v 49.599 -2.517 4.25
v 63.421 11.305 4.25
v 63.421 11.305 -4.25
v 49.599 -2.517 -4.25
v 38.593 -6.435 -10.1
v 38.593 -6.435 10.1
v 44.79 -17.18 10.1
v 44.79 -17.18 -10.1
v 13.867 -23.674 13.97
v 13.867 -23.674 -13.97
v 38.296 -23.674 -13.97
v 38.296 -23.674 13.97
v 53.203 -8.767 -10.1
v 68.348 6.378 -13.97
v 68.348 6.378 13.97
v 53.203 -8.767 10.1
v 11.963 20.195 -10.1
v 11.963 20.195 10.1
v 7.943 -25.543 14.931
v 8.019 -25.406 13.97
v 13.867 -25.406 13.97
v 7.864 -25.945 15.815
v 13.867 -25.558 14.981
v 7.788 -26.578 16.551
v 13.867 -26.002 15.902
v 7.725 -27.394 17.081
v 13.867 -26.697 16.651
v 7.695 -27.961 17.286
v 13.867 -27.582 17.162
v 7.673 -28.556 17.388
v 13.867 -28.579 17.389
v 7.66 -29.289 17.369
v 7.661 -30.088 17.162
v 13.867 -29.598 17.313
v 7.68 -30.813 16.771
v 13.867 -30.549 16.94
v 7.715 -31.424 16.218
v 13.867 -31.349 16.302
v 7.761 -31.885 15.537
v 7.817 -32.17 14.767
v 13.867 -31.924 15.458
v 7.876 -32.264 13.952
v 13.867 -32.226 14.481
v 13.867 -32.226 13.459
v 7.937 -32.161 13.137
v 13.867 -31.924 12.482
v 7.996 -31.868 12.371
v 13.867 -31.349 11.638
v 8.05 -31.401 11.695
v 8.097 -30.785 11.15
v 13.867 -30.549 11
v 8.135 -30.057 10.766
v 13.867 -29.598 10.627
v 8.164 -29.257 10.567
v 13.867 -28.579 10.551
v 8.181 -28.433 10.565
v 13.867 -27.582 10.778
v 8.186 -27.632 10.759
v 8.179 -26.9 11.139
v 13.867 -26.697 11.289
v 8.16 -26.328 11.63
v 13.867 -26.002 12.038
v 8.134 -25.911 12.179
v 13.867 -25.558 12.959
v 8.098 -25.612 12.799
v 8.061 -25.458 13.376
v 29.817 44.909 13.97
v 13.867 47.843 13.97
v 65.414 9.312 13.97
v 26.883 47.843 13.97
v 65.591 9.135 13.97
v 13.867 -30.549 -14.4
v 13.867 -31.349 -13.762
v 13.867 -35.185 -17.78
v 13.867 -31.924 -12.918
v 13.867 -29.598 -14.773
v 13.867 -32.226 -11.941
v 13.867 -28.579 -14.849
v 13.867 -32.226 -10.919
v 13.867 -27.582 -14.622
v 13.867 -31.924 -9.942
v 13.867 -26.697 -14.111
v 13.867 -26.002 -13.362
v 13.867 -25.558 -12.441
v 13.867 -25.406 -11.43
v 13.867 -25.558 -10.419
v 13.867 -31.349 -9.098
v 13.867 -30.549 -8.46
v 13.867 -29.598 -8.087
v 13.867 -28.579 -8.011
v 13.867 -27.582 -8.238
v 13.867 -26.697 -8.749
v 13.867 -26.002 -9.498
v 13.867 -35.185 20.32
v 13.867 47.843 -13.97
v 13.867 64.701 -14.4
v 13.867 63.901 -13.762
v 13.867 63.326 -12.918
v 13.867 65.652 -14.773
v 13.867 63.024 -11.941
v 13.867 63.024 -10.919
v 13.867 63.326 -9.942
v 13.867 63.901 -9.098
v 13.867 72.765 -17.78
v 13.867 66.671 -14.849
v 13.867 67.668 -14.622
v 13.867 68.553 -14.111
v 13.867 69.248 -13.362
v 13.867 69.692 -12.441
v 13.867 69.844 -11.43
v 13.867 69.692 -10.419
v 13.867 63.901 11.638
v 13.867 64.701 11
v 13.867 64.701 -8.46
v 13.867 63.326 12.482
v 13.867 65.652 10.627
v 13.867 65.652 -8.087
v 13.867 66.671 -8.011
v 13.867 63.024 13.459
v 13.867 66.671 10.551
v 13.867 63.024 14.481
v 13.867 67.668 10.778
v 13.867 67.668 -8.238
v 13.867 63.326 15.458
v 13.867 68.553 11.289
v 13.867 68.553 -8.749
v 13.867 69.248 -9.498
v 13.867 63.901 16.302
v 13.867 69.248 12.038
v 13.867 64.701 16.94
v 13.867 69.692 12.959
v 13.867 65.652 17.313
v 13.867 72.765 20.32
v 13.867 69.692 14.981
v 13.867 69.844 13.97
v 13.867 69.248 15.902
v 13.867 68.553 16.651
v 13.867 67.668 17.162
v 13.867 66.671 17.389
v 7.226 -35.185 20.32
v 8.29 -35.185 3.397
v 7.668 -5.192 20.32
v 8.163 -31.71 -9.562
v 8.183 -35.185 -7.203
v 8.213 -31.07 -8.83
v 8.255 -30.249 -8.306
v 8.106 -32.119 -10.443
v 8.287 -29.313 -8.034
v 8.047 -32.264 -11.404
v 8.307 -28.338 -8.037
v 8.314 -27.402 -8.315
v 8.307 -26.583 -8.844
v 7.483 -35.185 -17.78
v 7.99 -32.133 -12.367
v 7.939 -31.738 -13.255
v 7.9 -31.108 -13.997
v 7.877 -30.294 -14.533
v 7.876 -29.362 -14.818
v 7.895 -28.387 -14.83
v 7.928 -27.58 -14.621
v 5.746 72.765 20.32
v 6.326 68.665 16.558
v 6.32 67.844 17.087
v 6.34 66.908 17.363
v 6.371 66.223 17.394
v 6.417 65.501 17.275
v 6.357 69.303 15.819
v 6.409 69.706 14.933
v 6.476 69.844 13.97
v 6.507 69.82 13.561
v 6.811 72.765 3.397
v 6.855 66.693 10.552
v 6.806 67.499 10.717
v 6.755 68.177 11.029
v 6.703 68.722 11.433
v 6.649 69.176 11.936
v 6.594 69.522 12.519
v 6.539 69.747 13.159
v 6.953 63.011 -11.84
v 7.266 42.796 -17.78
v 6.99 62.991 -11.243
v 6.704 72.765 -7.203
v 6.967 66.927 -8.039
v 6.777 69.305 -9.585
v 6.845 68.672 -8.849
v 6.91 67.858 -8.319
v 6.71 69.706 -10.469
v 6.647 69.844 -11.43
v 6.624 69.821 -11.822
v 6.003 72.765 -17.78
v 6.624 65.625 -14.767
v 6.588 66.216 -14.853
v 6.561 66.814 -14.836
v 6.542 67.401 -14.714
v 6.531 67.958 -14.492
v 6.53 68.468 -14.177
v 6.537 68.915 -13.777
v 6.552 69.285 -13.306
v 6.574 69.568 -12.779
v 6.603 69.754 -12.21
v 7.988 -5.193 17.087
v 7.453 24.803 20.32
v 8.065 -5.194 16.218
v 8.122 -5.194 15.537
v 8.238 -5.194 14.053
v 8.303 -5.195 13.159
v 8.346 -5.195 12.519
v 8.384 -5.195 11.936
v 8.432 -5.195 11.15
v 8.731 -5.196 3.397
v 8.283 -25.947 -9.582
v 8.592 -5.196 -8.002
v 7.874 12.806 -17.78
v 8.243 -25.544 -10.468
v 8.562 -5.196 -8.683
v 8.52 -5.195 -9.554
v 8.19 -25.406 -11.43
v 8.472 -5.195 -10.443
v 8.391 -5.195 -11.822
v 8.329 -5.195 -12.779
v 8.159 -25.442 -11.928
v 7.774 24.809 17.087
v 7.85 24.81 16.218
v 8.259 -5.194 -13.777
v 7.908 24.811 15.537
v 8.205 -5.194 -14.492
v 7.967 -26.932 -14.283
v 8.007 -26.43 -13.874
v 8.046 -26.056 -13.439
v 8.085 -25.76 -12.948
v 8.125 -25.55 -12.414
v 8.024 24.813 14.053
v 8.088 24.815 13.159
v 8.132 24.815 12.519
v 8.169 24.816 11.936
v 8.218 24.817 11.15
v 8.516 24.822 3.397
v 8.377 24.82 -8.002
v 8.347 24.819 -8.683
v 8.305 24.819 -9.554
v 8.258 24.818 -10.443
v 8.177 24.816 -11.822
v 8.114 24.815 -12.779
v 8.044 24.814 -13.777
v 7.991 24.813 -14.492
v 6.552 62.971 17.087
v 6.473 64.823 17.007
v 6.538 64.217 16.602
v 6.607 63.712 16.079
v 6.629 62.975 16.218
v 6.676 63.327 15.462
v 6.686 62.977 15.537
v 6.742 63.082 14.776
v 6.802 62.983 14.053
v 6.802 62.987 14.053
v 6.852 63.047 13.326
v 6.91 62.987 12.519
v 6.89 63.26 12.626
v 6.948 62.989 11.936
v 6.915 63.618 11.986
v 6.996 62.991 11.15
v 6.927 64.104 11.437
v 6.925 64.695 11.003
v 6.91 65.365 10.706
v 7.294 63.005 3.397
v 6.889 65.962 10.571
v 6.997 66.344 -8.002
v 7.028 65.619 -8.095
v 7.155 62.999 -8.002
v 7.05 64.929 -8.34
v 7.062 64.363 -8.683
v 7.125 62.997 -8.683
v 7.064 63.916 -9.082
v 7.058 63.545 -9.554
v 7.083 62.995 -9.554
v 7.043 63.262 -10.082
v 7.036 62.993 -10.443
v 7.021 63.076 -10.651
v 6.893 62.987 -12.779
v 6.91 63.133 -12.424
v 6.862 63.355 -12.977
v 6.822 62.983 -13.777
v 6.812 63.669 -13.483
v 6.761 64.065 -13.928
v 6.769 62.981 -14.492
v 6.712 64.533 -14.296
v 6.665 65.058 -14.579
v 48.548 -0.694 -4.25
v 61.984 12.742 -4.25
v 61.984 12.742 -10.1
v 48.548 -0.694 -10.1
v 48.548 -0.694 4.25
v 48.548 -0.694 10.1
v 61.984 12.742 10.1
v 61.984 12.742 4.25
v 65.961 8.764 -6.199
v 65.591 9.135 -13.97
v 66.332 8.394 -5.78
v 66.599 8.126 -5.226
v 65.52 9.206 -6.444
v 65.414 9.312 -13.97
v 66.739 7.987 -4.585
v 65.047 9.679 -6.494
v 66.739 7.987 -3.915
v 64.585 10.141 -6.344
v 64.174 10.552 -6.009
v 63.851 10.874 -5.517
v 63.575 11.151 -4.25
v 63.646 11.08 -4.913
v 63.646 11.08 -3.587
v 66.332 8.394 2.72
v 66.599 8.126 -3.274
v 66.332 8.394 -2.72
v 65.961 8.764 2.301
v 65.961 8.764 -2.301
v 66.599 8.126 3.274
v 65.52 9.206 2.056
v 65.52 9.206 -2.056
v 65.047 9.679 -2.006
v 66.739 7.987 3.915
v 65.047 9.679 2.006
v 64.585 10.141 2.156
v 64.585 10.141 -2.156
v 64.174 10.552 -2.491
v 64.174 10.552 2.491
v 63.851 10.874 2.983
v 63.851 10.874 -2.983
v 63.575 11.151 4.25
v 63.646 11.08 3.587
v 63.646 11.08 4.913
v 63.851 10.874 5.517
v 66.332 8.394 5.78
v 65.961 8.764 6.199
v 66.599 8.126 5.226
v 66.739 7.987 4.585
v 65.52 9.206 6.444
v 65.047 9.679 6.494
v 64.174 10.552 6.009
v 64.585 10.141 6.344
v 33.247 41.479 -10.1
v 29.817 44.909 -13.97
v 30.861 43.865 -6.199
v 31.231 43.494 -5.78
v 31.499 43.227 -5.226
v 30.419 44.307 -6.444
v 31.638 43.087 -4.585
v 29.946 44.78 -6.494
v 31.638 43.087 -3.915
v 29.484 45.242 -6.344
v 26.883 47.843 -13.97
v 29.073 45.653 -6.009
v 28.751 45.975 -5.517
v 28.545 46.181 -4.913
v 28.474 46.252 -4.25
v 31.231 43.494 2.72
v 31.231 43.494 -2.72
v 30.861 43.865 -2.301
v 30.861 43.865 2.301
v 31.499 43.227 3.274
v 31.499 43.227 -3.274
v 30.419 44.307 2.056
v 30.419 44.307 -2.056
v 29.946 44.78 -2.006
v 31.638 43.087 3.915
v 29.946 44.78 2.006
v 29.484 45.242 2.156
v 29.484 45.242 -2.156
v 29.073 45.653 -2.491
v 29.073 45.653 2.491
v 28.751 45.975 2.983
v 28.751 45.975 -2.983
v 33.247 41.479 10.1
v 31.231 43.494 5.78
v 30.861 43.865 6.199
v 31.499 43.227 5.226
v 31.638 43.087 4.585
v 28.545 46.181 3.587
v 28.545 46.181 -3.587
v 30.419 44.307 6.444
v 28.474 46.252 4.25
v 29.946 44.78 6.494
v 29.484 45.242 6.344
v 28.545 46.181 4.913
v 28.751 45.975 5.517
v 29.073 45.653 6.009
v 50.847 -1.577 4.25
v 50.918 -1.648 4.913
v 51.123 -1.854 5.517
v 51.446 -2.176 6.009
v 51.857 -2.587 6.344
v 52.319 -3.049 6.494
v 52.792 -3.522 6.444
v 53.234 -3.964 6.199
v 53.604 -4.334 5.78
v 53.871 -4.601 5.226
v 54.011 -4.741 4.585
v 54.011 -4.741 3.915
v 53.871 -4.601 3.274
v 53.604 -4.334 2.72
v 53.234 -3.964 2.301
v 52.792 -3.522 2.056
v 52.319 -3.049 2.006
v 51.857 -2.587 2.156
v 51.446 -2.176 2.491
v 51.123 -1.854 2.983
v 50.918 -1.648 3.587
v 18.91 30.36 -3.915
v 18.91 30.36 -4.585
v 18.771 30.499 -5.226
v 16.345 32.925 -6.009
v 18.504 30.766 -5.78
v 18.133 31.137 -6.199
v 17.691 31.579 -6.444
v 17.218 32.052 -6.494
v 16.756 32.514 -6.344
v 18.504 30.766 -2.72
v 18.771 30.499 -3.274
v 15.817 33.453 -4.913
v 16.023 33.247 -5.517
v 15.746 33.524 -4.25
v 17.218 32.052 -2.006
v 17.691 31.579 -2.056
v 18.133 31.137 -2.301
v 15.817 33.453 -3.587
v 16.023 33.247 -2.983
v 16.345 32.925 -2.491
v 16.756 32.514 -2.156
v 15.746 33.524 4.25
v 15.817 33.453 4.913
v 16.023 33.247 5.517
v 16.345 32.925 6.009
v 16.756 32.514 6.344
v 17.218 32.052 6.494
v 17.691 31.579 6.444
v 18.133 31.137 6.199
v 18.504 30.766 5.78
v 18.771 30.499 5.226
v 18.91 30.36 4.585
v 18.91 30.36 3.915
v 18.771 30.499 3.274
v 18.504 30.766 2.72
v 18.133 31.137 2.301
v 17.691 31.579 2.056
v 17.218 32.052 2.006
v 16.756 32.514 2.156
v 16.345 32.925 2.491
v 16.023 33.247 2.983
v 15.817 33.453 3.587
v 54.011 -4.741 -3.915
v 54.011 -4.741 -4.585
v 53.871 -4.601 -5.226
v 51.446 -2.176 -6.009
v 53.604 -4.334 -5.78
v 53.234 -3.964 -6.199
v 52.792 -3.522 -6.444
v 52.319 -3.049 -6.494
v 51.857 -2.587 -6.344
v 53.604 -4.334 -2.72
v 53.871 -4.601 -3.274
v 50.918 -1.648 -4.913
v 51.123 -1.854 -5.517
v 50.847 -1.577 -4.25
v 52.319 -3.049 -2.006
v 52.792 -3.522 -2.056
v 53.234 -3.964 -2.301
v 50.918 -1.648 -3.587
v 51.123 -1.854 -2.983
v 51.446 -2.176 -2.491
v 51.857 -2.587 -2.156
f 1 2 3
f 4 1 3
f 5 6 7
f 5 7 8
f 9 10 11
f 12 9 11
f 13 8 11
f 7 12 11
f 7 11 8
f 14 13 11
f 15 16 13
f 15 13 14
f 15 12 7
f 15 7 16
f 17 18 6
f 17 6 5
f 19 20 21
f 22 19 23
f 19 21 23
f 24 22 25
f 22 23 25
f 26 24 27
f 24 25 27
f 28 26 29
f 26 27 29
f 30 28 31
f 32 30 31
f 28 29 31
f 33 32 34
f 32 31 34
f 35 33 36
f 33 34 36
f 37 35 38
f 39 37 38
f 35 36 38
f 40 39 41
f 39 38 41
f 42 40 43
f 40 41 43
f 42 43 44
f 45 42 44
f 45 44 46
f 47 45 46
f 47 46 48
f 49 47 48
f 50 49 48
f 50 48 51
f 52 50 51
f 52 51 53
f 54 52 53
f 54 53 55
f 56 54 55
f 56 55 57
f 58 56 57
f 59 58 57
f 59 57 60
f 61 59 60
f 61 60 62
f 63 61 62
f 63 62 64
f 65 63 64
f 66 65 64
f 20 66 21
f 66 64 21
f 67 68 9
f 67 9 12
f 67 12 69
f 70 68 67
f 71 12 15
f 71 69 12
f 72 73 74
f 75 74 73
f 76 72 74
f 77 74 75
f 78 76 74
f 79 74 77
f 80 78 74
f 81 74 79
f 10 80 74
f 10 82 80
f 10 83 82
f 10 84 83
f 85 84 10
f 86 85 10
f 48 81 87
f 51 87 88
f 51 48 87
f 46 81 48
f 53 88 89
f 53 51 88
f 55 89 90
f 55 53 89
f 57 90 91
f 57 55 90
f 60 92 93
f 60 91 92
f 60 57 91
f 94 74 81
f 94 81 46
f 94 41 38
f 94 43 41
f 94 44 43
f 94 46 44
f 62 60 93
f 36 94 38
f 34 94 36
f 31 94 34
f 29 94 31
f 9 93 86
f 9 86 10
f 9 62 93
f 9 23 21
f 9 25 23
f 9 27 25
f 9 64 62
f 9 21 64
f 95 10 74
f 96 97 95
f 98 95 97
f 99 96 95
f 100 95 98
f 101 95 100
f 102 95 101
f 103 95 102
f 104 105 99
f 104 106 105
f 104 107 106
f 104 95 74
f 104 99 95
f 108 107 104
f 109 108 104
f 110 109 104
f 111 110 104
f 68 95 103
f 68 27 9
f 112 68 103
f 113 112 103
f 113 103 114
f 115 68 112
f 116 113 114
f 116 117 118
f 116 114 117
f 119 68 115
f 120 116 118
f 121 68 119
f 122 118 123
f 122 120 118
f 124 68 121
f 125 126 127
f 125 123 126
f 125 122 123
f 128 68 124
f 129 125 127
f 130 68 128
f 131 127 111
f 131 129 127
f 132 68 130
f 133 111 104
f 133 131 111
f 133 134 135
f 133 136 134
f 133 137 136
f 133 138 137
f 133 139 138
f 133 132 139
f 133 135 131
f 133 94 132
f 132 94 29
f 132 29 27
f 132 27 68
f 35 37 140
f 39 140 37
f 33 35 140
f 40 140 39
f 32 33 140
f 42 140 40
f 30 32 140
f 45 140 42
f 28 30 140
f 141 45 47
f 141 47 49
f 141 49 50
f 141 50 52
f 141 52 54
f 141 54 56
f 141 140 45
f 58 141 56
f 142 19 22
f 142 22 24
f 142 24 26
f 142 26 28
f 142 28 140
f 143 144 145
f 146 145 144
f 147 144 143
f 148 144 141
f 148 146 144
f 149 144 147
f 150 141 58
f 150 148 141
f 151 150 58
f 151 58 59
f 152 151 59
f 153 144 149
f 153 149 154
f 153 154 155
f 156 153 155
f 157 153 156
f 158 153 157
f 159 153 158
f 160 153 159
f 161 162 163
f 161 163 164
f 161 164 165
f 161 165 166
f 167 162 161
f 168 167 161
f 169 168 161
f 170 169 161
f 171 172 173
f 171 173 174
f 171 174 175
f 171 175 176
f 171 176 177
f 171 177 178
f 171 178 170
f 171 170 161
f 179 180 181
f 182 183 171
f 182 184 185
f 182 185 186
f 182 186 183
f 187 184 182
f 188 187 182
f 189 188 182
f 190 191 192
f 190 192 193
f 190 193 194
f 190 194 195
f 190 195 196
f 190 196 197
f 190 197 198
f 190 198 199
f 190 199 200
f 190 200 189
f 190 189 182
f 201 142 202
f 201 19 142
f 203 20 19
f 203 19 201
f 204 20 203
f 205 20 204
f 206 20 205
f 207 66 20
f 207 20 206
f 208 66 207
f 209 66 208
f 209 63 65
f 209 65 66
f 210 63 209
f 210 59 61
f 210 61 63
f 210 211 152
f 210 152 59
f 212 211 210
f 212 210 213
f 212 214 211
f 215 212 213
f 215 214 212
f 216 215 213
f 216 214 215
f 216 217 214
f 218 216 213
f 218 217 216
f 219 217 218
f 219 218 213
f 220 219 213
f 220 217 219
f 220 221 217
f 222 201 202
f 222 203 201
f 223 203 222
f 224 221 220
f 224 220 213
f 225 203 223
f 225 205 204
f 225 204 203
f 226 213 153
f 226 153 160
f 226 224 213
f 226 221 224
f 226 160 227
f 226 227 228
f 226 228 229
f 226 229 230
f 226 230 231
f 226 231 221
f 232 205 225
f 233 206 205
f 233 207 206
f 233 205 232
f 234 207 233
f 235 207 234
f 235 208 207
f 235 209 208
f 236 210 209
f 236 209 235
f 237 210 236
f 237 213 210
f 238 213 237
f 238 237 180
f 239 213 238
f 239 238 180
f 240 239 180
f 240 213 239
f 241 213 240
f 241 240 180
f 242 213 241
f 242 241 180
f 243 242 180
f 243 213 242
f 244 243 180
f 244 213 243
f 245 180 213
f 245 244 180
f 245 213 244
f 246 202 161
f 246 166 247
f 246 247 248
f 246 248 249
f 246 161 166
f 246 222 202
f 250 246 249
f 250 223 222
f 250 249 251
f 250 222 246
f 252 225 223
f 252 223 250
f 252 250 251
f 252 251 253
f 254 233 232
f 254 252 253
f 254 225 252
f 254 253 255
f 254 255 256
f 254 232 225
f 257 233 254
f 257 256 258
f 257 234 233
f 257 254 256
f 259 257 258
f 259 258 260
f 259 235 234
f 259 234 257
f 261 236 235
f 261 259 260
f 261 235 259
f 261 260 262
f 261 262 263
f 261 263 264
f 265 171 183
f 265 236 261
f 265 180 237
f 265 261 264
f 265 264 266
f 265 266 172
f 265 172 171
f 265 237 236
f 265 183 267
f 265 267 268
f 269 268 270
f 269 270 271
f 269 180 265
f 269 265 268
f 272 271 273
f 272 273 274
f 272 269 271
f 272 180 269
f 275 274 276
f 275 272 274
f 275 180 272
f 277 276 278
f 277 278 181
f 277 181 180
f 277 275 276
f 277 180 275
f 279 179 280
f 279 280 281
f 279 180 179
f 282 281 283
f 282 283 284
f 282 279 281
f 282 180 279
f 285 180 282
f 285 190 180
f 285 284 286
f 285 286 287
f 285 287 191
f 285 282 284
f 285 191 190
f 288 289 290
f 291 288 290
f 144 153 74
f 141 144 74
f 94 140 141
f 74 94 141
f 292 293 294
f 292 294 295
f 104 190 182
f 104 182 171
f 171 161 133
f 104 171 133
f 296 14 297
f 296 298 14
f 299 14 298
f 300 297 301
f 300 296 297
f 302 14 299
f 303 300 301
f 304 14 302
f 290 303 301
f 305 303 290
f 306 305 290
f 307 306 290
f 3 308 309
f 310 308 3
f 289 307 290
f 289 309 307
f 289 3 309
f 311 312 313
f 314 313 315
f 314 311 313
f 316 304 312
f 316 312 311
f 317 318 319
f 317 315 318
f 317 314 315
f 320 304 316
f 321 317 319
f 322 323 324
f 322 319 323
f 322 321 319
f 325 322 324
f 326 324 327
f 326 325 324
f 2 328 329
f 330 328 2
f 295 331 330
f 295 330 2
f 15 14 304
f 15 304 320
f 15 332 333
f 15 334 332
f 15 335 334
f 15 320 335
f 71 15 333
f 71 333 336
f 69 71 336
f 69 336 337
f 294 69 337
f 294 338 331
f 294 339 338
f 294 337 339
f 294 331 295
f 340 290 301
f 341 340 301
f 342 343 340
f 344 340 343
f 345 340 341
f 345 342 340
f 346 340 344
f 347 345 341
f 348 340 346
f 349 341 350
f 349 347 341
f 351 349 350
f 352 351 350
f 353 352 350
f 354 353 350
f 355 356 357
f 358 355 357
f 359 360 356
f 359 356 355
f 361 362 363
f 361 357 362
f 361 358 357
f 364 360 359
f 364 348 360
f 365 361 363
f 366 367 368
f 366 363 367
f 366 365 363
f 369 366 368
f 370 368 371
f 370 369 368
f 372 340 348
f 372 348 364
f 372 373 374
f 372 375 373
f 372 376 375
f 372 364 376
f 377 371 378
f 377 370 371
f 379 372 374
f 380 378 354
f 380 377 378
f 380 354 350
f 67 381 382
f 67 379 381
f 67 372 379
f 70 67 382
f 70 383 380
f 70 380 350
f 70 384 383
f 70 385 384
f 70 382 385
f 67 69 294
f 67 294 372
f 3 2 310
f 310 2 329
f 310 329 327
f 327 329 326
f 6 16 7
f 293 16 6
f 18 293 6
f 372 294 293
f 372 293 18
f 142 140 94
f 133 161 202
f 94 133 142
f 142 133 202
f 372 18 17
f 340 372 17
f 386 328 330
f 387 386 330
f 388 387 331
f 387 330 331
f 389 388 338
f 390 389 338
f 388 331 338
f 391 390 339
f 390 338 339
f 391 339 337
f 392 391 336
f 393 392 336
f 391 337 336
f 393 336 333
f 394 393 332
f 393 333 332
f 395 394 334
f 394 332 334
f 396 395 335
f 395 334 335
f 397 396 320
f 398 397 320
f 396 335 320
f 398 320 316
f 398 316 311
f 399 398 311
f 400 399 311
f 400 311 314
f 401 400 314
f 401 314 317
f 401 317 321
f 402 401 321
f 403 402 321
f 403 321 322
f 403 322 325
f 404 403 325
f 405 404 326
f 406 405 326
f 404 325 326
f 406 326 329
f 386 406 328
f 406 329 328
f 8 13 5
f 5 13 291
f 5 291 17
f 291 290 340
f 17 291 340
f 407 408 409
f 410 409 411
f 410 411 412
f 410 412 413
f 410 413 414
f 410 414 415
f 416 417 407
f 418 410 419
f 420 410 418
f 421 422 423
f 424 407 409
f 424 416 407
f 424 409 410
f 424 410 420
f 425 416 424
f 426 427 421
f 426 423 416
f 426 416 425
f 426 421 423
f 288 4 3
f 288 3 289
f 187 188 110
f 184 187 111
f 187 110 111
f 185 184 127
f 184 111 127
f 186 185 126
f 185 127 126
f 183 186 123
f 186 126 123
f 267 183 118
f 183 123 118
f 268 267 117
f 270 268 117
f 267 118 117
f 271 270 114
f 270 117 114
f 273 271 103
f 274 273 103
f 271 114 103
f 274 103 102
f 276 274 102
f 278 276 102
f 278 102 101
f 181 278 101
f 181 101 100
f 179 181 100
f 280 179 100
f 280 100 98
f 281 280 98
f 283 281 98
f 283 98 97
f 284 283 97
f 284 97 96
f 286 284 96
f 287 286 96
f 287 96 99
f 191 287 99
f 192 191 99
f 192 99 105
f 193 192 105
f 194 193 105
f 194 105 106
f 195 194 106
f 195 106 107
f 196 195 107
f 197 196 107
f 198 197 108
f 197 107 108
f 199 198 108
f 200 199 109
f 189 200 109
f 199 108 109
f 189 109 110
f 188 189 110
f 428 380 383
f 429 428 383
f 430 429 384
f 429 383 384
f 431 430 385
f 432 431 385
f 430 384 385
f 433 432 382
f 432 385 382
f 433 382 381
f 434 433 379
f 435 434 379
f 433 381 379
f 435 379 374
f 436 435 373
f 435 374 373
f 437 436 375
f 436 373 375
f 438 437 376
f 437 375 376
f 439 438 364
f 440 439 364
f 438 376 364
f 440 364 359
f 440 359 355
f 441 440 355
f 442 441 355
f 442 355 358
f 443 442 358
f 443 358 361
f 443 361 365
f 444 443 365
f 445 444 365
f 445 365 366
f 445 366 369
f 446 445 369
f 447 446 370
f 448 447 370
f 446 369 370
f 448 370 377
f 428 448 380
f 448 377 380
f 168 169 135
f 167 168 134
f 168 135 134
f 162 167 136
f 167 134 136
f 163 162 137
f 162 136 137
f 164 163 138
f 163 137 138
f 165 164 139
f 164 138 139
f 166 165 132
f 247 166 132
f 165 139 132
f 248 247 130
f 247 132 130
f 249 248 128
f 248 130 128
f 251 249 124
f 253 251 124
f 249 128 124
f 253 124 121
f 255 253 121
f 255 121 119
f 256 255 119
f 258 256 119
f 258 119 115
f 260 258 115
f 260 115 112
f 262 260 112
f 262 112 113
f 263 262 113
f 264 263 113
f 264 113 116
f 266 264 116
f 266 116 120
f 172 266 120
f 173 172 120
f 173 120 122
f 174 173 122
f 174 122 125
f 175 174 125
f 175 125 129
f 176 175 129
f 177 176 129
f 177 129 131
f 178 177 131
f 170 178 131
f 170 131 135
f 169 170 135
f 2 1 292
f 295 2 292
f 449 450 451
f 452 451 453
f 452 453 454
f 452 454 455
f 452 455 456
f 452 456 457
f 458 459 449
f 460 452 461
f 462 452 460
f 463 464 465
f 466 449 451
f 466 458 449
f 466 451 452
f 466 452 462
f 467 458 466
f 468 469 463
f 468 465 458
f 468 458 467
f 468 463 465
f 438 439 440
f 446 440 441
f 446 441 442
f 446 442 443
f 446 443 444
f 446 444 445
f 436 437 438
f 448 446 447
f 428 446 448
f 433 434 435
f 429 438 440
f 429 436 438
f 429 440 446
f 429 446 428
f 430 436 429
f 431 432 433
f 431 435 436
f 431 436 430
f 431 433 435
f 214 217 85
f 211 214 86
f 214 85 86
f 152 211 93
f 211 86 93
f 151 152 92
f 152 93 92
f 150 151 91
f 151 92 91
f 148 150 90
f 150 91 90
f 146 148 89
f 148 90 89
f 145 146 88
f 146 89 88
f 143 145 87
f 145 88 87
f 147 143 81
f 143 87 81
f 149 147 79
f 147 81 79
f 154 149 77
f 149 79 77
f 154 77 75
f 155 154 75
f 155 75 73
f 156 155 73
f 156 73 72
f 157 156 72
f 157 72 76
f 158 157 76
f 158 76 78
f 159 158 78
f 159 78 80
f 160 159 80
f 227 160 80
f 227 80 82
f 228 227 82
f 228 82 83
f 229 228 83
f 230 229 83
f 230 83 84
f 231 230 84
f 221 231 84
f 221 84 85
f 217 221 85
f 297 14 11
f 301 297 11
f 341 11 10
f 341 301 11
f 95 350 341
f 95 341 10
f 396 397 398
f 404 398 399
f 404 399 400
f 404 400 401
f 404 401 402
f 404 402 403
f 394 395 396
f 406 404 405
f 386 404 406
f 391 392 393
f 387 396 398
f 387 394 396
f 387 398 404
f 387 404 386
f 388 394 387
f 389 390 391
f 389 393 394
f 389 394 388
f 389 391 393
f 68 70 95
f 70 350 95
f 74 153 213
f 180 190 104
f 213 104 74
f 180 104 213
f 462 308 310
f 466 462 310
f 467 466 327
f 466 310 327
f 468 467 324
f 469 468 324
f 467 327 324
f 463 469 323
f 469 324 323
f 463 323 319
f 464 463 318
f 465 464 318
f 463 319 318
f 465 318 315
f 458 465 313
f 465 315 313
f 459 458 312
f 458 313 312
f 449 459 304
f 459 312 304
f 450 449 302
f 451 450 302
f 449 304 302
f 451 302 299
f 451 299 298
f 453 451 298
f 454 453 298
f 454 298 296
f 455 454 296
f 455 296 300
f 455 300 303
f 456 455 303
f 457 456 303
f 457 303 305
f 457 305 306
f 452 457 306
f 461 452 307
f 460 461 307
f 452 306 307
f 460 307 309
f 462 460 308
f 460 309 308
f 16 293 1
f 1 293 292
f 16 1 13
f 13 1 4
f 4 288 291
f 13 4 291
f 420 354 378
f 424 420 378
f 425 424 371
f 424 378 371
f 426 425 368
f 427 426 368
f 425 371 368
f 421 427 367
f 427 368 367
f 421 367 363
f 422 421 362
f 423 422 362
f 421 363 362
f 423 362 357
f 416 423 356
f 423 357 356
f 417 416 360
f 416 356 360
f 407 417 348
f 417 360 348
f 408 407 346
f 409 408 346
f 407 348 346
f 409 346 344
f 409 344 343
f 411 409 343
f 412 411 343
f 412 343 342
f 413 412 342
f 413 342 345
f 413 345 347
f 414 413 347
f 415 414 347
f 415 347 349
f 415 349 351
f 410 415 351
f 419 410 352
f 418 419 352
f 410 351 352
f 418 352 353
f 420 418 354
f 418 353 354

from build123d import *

# Parameters (mm, degrees)
SKETCH1_W               = 15.24
SKETCH1_H               = 47.25
BOSS_EXTRUDE1_DEPTH     = 29
BOSS_EXTRUDE2_DEPTH     = 15.24
BOSS_EXTRUDE3_START     = 6.35
BOSS_EXTRUDE3_DEPTH     = 27.94
CUT_EXTRUDE4_DEPTH      = 90.856122335
CUT_EXTRUDE4_DEPTH_BACK = 90.856122335
BOSS_EXTRUDE4_START     = 12.7
SKETCH15_W              = 12.73404056
SKETCH15_H              = 107.95
BOSS_EXTRUDE4_DEPTH     = 38.1
SKETCH17_R              = 3.429
CUT_EXTRUDE6_DEPTH      = 95.762638832
BOSS_EXTRUDE9_DEPTH     = 6.35
BOSS_EXTRUDE10_DEPTH    = 6.35
SKETCH12_W              = 20.20062
SKETCH12_H              = 40.64
CUT_EXTRUDE8_DEPTH      = 38.1
SKETCH21_W              = 27.94
SKETCH21_H              = 50.342193805
CUT_EXTRUDE9_DEPTH      = 8
SKETCH22_W              = 27.94
SKETCH22_H              = 8
CUT_EXTRUDE10_DEPTH     = 2.54
BOSS_EXTRUDE11_DEPTH    = 13.97
SKETCH24_W              = 11.491520074
SKETCH24_H              = 20.20062
CUT_EXTRUDE11_DEPTH     = 112.502999945
SKETCH25_R              = 2.249999945
CUT_EXTRUDE12_DEPTH     = 18
CUT_EXTRUDE13_REACH     = 83.705
SKETCH26_W              = 8.500000018
SKETCH26_H              = 2.032


with BuildPart() as part:
    # Sketch1 → Boss-Extrude1 (new body)
    with BuildSketch(Plane(origin=(0, 0, 0), x_dir=(0, 0, -1), z_dir=(1, 0, 0))):
        Rectangle(SKETCH1_W, SKETCH1_H)
    extrude(amount=BOSS_EXTRUDE1_DEPTH)

    # Sketch8 → Cut-Revolve1 (revolve, cut)
    with BuildSketch(Plane(origin=(0, 0, 0), x_dir=(1, 0, 0), z_dir=(0, 1, 0))):
        with BuildLine():
            Line((-1363.98, 509.27), (-1363.98, -509.27))
            add(Edge.make_bspline(
                [(-1363.98, -509.27), (8.89, -509.27), (8.89, 0), (8.89, 509.27), (-1363.98, 509.27)],
                knots=[4.71238898, 4.71238898, 4.71238898, 6.283185307, 6.283185307, 7.853981634, 7.853981634, 7.853981634], degree=2, weights=[1, 0.707106781, 1, 0.707106781, 1]))
        make_face()
    revolve(axis=Axis((-1363.98, 0, -509.27), (0, 0, 1)), mode=Mode.SUBTRACT)

    # Sketch9 → Boss-Extrude2 (add)
    with BuildSketch(Plane.XY.offset(7.62)):
        Polygon((29, -23.625), (57.293684645, -23.625), (29, 23.625), align=None)
    extrude(amount=-BOSS_EXTRUDE2_DEPTH)

    # Sketch11 → Boss-Extrude3 (add)
    with BuildSketch(Plane(origin=(0, 0, -7.62), x_dir=(-1, 0, 0), z_dir=(0, 0, -1)).offset(BOSS_EXTRUDE3_START)):
        Polygon((-8.532999942, 23.625), (-35.473768305, 50.565768363), (-71.071074924, 14.968461744), (-48.544371121, -9.013786608), (-28.889356272, 23.625), align=None)
    extrude(amount=-BOSS_EXTRUDE3_DEPTH)

    # Sketch13 → Cut-Extrude4 (cut, two sides: drawn at the far end of the back side and taken through both)
    with BuildSketch(Plane(origin=(0, 0, -7.62), x_dir=(-1, 0, 0), z_dir=(0, 0, -1)).offset(-CUT_EXTRUDE4_DEPTH_BACK)):
        Polygon((-61.672265147, 5.569651967), (-8.532999942, -23.625), (-25.02523354, -53.6436889), (-79.417056311, -23.760883228), align=None)
    extrude(amount=CUT_EXTRUDE4_DEPTH + CUT_EXTRUDE4_DEPTH_BACK, mode=Mode.SUBTRACT)

    # Sketch15 → Boss-Extrude4 (add)
    with BuildSketch(Plane.XY.offset(7.62).offset(BOSS_EXTRUDE4_START)):
        with Locations((7.499979662, 18.790026662)):
            Rectangle(SKETCH15_W, SKETCH15_H)
    extrude(amount=-BOSS_EXTRUDE4_DEPTH)

    # Sketch16 → Cut-Revolve2 (revolve, cut)
    with BuildSketch(Plane(origin=(0, 0, 0), x_dir=(1, 0, 0), z_dir=(0, 1, 0))):
        with BuildLine():
            Line((-1364.099005706, 509.27), (-1364.099005706, -509.27))
            add(Edge.make_bspline(
                [(-1364.099005706, -509.27), (8.770994294, -509.27), (8.770994294, 0), (8.770994294, 509.27), (-1364.099005706, 509.27)],
                knots=[4.71238898, 4.71238898, 4.71238898, 6.283185307, 6.283185307, 7.853981634, 7.853981634, 7.853981634], degree=2, weights=[1, 0.707106781, 1, 0.707106781, 1]))
        make_face()
    revolve(axis=Axis((-1364.099005706, 0, -509.27), (0, 0, 1)), mode=Mode.SUBTRACT)

    # Sketch17 → Cut-Extrude6 (cut, through all)
    with BuildSketch(Plane(origin=(13.866999942, 0, 0), x_dir=(0, 0, -1), z_dir=(1, 0, 0))):
        with Locations(Location((-13.97, -28.834973338, 0), (0, 0, 90))):
            Circle(SKETCH17_R)
        with Locations(Location((-13.97, 66.415026662, 0), (0, 0, 90))):
            Circle(SKETCH17_R)
        with Locations(Location((11.43, 66.415026662, 0), (0, 0, 90))):
            Circle(SKETCH17_R)
        with Locations(Location((11.43, -28.834973338, 0), (0, 0, 90))):
            Circle(SKETCH17_R)
    extrude(amount=-CUT_EXTRUDE6_DEPTH, mode=Mode.SUBTRACT)

    # Sketch19 → Boss-Extrude9 (add)
    with BuildSketch(Plane.XY.offset(7.62)):
        Polygon((13.866999942, 23.625), (13.866999942, -20.694506456), (45.209055073, -3.475216955), (28.889356272, 23.625), align=None)
    extrude(amount=BOSS_EXTRUDE9_DEPTH)

    # Sketch20 → Boss-Extrude10 (add)
    with BuildSketch(Plane(origin=(0, 0, -7.62), x_dir=(-1, 0, 0), z_dir=(0, 0, -1))):
        Polygon((-45.209055073, -3.475216955), (-13.866999942, -20.694506456), (-13.866999942, 23.625), (-28.889356272, 23.625), align=None)
    extrude(amount=BOSS_EXTRUDE10_DEPTH)

    # Sketch12 → Cut-Extrude8 (cut)
    with BuildSketch(Plane(origin=(43.019768334, 43.019768334, 0), x_dir=(0, 0, -1), z_dir=(0.7071067811865476, 0.7071067811865476, 0))):
        with Locations((0, -14.49944132)):
            Rectangle(SKETCH12_W, SKETCH12_H)
    extrude(amount=-CUT_EXTRUDE8_DEPTH, mode=Mode.SUBTRACT)

    # Sketch21 → Cut-Extrude9 (cut)
    with BuildSketch(Plane(origin=(43.019768334, 43.019768334, 0), x_dir=(0, 0, -1), z_dir=(0.7071067811865477, 0.7071067811865475, 0))):
        with Locations((0, -14.49944132)):
            Rectangle(SKETCH21_W, SKETCH21_H)
    extrude(amount=-CUT_EXTRUDE9_DEPTH, mode=Mode.SUBTRACT)

    # Sketch22 → Cut-Extrude10 (cut)
    with BuildSketch(Plane(origin=(28.05130659, -28.05130659, 0), x_dir=(0, 0, 1), z_dir=(-0.7071067811865476, 0.7071067811865476, 0))):
        with Locations((0, 56.839139829)):
            Rectangle(SKETCH22_W, SKETCH22_H)
    extrude(amount=-CUT_EXTRUDE10_DEPTH, mode=Mode.SUBTRACT)

    # Sketch23 → Boss-Extrude11 (add, symmetric)
    with BuildSketch(Plane.XY):
        Polygon((29.816914056, 44.908914114), (26.883196541, 47.842631629), (13.866999942, 47.842631629), (13.866999942, 28.959), align=None)
        Polygon((65.591257632, 9.134570538), (13.866999942, -20.694506456), (13.866999942, -23.674292513), (38.295755697, -23.674292513), (68.34793819, 6.37788998), align=None)
    extrude(amount=BOSS_EXTRUDE11_DEPTH, both=True)

    # Sketch24 → Cut-Extrude11 (cut, through all)
    with BuildSketch(Plane(origin=(12.416727049, -21.530870355, 0), x_dir=(0.8662714122168664, 0.49957365860881403, 0), z_dir=(-0.49957365860881403, 0.8662714122168664, 0))):
        with Locations((35.963054904, 0)):
            Rectangle(SKETCH24_W, SKETCH24_H)
    extrude(amount=-CUT_EXTRUDE11_DEPTH, mode=Mode.SUBTRACT)

    # Sketch25 → Cut-Extrude12 (cut)
    with BuildSketch(Plane(origin=(37.362914085, 37.362914085, 0), x_dir=(0, 0, -1), z_dir=(0.7071067811865476, 0.7071067811865475, 0))):
        with Locations(Location((-4.250000009, 10.32055868, 0), (0, 0, 90))):
            Circle(SKETCH25_R)
        with Locations(Location((4.250000009, 10.32055868, 0), (0, 0, 90))):
            Circle(SKETCH25_R)
        with Locations(Location((-4.250000009, -39.31944132, 0), (0, 0, 90))):
            Circle(SKETCH25_R)
        with Locations(Location((4.250000009, -39.31944132, 0), (0, 0, 90))):
            Circle(SKETCH25_R)
    extrude(amount=-CUT_EXTRUDE12_DEPTH, mode=Mode.SUBTRACT)

    # Cut-Extrude13: up to this plane
    cut_extrude13_end = Plane(origin=(68.733790735, -35.697044307, 10.10031), z_dir=(0.8662714122168665, 0.49957365860881403, -3.0669196206838748e-15))
    # Sketch26 → Cut-Extrude13 (cut, up to the surface)
    with BuildSketch(Plane(origin=(37.362914085, 37.362914085, 0), x_dir=(0, 0, -1), z_dir=(0.7071067811865476, 0.7071067811865475, 0)), mode=Mode.PRIVATE) as cut_extrude13_sk1:
        with Locations((0, -35.83544132)):
            Rectangle(SKETCH26_W, SKETCH26_H)
    cut_extrude13_tool1 = split(extrude(cut_extrude13_sk1.sketch, amount=-CUT_EXTRUDE13_REACH, mode=Mode.PRIVATE), bisect_by=cut_extrude13_end, keep=Keep.BOTH, mode=Mode.PRIVATE)
    add(cut_extrude13_tool1.solids().sort_by_distance((62.702398, 12.023431, 0))[0], mode=Mode.SUBTRACT)


solid = part.part
